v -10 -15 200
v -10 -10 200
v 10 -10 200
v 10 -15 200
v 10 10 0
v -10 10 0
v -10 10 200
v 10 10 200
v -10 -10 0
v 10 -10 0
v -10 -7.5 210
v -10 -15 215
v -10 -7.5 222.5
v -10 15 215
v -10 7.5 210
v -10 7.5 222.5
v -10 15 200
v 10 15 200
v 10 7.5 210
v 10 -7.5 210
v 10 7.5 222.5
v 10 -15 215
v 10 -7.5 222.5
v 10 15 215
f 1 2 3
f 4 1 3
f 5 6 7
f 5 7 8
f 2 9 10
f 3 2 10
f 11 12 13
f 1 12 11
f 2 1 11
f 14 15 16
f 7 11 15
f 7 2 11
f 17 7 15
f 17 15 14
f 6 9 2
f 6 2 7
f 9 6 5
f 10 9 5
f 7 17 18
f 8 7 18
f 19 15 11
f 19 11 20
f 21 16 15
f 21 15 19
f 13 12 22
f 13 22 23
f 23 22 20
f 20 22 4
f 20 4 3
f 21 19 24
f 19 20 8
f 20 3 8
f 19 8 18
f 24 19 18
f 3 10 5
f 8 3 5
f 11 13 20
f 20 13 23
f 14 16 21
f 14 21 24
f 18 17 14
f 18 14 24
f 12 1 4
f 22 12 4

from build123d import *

# Parameters (mm, degrees)
SKETCH1_W           = 20
SKETCH1_H           = 20
BOSS_EXTRUDE1_DEPTH = 200
SKETCH2_W           = 20
SKETCH2_H           = 30
BOSS_EXTRUDE2_DEPTH = 25
SKETCH3_W           = 20
SKETCH3_H           = 15
CUT_EXTRUDE1_DEPTH  = 15
CHAMFER1_SIZE       = 10
CHAMFER3_SIZE       = 10


with BuildPart() as part:
    # Sketch1 → Boss-Extrude1 (new body)
    with BuildSketch(Plane.XY):
        Rectangle(SKETCH1_W, SKETCH1_H)
    extrude(amount=BOSS_EXTRUDE1_DEPTH)

    # Sketch2 → Boss-Extrude2 (add)
    with BuildSketch(Plane.XY.offset(200)):
        Rectangle(SKETCH2_W, SKETCH2_H)
    extrude(amount=BOSS_EXTRUDE2_DEPTH)

    # Sketch3 → Cut-Extrude1 (cut)
    with BuildSketch(Plane.XY.offset(225)):
        Rectangle(SKETCH3_W, SKETCH3_H)
    extrude(amount=-CUT_EXTRUDE1_DEPTH, mode=Mode.SUBTRACT)

    # Chamfer1
    # the kernel refuses this chamfer: 10 mm, written as the material it takes off along each edge
    with BuildSketch(Plane(origin=(35.71682988, 15, 225), x_dir=(0, -0.9996219169112968, 0.0274958766105877), z_dir=(-1, 0, 0))) as chamfer1_piece_1:
        Polygon((CHAMFER1_SIZE * 0.999621916911, -CHAMFER1_SIZE * 0.0274958766106), (-CHAMFER1_SIZE * 0.0274958766106, -CHAMFER1_SIZE * 0.999621916911), (0, 0), align=None)
    extrude(amount=71.433659759, mode=Mode.SUBTRACT)

    # Chamfer3
    # the kernel refuses this chamfer: 10 mm, written as the material it takes off along each edge
    with BuildSketch(Plane(origin=(-35.71682988, -15, 225), x_dir=(0, -0.027495876610586282, -0.9996219169112968), z_dir=(1, 0, 0))) as chamfer3_piece_1:
        Polygon((CHAMFER3_SIZE * 0.999621916911, CHAMFER3_SIZE * 0.0274958766106), (-CHAMFER3_SIZE * 0.0274958766106, CHAMFER3_SIZE * 0.999621916911), (0, 0), align=None)
    extrude(amount=71.433659759, mode=Mode.SUBTRACT)


solid = part.part
